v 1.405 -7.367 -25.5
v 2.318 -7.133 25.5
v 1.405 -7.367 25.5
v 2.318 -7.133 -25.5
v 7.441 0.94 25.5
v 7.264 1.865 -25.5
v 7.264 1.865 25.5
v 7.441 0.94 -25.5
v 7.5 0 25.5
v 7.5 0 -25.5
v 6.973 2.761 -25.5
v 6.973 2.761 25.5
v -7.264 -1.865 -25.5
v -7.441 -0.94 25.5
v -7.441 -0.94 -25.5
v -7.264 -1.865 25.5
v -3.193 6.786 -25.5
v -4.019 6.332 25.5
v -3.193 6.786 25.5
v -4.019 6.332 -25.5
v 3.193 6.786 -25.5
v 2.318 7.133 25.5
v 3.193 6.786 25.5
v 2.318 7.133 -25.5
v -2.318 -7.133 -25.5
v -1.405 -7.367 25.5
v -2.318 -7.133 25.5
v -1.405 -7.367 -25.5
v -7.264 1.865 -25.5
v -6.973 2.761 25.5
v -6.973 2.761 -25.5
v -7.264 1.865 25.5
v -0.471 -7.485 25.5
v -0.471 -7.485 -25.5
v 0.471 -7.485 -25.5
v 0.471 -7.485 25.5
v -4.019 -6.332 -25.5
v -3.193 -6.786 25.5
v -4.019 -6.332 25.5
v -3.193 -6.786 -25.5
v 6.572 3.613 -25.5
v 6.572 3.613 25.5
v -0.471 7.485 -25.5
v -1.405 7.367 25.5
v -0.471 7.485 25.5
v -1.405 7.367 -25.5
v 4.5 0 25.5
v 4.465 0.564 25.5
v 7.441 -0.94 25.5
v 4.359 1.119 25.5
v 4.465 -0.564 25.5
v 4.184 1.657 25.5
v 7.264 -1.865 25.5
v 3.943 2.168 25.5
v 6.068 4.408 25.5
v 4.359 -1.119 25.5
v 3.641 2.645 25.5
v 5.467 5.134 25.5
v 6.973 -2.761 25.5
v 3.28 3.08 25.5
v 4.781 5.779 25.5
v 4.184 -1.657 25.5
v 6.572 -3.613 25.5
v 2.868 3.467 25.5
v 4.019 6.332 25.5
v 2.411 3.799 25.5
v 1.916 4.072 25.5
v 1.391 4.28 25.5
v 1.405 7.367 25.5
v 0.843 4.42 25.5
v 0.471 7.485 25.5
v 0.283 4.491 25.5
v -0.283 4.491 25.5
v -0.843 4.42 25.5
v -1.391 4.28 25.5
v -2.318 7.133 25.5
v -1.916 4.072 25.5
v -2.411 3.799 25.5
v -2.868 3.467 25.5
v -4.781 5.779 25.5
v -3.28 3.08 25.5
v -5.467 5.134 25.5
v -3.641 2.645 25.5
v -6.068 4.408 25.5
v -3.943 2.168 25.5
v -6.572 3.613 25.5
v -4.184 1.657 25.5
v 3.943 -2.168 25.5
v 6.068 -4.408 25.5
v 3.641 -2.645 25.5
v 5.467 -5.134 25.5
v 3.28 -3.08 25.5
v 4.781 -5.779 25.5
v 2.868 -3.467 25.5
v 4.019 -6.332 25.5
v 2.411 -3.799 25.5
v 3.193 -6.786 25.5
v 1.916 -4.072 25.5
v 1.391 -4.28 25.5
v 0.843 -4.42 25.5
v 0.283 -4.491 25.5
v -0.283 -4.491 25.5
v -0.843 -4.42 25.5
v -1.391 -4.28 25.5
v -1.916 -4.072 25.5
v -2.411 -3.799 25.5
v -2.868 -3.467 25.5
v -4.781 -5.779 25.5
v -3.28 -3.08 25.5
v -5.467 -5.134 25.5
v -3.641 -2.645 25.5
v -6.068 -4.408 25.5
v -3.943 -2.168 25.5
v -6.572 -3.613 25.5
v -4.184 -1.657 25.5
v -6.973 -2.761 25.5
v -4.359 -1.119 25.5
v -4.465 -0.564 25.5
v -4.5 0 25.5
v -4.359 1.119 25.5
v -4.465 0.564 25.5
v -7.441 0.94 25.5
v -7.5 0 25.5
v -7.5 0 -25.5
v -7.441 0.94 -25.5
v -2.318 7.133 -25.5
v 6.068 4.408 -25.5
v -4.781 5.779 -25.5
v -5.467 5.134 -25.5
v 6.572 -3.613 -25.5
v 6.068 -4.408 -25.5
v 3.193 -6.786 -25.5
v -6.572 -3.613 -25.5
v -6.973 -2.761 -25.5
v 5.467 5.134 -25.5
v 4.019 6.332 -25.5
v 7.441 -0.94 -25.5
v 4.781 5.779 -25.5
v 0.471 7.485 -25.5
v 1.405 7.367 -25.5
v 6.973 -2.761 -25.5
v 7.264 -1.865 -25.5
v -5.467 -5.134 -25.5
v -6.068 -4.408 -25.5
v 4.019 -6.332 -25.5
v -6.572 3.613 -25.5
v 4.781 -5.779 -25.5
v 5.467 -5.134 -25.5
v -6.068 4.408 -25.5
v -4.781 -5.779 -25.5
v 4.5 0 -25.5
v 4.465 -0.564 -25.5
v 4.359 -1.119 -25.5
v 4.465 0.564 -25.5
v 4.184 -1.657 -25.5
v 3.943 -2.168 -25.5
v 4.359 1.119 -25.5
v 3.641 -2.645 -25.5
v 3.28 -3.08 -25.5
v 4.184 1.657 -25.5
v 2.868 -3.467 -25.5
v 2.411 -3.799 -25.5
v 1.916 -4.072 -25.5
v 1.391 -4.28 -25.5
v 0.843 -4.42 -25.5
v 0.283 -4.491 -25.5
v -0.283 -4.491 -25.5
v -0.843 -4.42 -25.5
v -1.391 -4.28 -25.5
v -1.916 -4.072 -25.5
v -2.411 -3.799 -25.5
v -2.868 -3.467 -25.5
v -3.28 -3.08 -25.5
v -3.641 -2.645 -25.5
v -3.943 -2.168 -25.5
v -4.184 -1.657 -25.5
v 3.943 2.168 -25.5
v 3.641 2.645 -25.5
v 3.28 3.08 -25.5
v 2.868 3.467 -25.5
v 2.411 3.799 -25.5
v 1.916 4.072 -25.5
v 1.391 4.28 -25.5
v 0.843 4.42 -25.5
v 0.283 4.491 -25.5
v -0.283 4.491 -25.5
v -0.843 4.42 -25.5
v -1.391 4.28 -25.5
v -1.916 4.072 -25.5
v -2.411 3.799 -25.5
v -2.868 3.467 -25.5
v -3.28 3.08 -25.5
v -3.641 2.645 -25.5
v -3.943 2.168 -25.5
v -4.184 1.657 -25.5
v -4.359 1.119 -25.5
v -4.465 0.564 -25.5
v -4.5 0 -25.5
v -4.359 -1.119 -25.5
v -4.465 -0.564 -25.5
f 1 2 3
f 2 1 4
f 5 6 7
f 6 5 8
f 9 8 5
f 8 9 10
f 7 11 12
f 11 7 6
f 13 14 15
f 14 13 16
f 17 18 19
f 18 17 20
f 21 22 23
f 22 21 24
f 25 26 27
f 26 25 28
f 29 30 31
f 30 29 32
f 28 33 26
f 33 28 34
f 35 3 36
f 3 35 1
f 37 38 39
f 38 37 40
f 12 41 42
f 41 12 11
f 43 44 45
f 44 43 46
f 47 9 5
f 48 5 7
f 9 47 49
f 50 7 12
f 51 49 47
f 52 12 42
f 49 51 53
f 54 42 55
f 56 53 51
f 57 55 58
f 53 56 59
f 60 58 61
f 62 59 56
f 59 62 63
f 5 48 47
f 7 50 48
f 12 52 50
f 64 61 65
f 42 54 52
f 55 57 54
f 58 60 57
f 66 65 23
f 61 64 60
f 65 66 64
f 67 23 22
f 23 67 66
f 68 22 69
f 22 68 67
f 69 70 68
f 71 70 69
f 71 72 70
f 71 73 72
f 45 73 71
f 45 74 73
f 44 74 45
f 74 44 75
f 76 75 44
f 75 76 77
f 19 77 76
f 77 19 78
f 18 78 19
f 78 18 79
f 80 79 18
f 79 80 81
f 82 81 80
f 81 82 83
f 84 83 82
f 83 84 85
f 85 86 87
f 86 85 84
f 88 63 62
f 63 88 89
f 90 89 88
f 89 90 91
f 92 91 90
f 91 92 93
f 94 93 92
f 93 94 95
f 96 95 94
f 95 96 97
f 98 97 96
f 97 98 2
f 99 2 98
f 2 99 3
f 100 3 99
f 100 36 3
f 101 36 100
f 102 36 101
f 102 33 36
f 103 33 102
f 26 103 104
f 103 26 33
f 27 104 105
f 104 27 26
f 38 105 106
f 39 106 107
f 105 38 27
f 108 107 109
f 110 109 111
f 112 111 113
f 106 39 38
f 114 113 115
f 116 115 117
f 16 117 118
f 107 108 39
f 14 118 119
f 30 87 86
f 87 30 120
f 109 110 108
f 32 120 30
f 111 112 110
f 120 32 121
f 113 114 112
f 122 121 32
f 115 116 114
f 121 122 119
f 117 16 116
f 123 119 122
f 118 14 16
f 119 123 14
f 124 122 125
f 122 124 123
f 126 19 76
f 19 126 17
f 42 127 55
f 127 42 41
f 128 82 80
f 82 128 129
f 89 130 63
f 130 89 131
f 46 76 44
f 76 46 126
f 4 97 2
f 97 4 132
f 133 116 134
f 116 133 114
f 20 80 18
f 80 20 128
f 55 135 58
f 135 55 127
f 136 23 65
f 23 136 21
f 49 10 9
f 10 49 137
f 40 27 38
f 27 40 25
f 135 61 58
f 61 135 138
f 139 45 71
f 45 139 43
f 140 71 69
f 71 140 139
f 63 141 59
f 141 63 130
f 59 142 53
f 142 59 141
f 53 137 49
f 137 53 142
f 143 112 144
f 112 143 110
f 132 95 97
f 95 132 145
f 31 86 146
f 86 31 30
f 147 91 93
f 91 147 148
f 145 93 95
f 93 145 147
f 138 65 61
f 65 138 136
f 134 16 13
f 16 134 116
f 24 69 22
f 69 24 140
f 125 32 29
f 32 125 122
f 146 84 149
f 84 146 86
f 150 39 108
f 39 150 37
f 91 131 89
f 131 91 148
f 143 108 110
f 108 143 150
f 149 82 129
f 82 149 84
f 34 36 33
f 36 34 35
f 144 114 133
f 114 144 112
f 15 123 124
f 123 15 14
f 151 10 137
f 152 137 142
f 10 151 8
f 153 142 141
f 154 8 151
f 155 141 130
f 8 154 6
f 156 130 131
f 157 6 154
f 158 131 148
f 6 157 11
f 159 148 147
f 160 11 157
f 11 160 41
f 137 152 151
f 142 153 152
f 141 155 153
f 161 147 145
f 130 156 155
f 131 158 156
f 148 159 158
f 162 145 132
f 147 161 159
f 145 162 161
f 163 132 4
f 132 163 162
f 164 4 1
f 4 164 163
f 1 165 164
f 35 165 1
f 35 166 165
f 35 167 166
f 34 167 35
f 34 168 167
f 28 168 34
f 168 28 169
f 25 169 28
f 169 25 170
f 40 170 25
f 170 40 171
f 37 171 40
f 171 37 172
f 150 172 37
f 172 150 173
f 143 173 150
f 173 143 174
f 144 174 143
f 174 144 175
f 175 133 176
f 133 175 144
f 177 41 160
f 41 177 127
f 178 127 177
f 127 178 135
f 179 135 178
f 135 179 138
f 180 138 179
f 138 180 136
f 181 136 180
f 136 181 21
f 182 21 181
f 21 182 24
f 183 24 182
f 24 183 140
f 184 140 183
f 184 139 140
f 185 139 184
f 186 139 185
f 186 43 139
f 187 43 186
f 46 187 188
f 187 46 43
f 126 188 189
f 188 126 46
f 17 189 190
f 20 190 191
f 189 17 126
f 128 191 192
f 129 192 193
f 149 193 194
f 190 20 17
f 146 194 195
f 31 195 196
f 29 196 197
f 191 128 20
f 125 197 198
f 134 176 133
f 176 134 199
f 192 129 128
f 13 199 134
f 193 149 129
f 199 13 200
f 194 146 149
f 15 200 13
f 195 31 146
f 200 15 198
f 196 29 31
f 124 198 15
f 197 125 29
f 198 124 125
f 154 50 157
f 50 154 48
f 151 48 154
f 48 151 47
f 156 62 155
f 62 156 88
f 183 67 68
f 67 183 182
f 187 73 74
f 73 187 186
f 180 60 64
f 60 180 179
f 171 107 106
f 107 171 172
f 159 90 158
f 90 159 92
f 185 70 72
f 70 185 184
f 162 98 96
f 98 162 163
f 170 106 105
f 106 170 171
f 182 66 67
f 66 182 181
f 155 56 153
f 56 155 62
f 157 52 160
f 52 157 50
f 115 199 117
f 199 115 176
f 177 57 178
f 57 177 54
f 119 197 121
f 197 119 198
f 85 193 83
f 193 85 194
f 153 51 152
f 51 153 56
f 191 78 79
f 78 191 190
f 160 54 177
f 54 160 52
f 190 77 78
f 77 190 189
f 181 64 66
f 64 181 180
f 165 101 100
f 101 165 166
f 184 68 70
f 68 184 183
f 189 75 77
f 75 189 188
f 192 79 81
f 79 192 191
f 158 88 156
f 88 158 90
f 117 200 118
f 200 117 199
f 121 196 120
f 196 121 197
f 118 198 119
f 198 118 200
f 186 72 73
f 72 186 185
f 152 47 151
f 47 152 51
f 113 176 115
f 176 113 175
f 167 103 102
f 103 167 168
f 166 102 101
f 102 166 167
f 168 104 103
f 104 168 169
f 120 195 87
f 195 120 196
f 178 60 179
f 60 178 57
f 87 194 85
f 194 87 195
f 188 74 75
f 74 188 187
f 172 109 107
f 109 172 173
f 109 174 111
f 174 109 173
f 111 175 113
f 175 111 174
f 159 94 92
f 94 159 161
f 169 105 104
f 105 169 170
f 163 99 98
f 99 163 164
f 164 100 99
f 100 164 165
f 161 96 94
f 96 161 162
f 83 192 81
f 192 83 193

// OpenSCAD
$fn = 50;


difference() {
	union() {
		translate(v = [0, 0, -25.5000000000]) {
			cylinder(h = 51, r = 7.5000000000);
		}
	}
	union() {
		translate(v = [0, 0, -100.0000000000]) {
			cylinder(h = 200, r = 4.5000000000);
		}
	}
}
